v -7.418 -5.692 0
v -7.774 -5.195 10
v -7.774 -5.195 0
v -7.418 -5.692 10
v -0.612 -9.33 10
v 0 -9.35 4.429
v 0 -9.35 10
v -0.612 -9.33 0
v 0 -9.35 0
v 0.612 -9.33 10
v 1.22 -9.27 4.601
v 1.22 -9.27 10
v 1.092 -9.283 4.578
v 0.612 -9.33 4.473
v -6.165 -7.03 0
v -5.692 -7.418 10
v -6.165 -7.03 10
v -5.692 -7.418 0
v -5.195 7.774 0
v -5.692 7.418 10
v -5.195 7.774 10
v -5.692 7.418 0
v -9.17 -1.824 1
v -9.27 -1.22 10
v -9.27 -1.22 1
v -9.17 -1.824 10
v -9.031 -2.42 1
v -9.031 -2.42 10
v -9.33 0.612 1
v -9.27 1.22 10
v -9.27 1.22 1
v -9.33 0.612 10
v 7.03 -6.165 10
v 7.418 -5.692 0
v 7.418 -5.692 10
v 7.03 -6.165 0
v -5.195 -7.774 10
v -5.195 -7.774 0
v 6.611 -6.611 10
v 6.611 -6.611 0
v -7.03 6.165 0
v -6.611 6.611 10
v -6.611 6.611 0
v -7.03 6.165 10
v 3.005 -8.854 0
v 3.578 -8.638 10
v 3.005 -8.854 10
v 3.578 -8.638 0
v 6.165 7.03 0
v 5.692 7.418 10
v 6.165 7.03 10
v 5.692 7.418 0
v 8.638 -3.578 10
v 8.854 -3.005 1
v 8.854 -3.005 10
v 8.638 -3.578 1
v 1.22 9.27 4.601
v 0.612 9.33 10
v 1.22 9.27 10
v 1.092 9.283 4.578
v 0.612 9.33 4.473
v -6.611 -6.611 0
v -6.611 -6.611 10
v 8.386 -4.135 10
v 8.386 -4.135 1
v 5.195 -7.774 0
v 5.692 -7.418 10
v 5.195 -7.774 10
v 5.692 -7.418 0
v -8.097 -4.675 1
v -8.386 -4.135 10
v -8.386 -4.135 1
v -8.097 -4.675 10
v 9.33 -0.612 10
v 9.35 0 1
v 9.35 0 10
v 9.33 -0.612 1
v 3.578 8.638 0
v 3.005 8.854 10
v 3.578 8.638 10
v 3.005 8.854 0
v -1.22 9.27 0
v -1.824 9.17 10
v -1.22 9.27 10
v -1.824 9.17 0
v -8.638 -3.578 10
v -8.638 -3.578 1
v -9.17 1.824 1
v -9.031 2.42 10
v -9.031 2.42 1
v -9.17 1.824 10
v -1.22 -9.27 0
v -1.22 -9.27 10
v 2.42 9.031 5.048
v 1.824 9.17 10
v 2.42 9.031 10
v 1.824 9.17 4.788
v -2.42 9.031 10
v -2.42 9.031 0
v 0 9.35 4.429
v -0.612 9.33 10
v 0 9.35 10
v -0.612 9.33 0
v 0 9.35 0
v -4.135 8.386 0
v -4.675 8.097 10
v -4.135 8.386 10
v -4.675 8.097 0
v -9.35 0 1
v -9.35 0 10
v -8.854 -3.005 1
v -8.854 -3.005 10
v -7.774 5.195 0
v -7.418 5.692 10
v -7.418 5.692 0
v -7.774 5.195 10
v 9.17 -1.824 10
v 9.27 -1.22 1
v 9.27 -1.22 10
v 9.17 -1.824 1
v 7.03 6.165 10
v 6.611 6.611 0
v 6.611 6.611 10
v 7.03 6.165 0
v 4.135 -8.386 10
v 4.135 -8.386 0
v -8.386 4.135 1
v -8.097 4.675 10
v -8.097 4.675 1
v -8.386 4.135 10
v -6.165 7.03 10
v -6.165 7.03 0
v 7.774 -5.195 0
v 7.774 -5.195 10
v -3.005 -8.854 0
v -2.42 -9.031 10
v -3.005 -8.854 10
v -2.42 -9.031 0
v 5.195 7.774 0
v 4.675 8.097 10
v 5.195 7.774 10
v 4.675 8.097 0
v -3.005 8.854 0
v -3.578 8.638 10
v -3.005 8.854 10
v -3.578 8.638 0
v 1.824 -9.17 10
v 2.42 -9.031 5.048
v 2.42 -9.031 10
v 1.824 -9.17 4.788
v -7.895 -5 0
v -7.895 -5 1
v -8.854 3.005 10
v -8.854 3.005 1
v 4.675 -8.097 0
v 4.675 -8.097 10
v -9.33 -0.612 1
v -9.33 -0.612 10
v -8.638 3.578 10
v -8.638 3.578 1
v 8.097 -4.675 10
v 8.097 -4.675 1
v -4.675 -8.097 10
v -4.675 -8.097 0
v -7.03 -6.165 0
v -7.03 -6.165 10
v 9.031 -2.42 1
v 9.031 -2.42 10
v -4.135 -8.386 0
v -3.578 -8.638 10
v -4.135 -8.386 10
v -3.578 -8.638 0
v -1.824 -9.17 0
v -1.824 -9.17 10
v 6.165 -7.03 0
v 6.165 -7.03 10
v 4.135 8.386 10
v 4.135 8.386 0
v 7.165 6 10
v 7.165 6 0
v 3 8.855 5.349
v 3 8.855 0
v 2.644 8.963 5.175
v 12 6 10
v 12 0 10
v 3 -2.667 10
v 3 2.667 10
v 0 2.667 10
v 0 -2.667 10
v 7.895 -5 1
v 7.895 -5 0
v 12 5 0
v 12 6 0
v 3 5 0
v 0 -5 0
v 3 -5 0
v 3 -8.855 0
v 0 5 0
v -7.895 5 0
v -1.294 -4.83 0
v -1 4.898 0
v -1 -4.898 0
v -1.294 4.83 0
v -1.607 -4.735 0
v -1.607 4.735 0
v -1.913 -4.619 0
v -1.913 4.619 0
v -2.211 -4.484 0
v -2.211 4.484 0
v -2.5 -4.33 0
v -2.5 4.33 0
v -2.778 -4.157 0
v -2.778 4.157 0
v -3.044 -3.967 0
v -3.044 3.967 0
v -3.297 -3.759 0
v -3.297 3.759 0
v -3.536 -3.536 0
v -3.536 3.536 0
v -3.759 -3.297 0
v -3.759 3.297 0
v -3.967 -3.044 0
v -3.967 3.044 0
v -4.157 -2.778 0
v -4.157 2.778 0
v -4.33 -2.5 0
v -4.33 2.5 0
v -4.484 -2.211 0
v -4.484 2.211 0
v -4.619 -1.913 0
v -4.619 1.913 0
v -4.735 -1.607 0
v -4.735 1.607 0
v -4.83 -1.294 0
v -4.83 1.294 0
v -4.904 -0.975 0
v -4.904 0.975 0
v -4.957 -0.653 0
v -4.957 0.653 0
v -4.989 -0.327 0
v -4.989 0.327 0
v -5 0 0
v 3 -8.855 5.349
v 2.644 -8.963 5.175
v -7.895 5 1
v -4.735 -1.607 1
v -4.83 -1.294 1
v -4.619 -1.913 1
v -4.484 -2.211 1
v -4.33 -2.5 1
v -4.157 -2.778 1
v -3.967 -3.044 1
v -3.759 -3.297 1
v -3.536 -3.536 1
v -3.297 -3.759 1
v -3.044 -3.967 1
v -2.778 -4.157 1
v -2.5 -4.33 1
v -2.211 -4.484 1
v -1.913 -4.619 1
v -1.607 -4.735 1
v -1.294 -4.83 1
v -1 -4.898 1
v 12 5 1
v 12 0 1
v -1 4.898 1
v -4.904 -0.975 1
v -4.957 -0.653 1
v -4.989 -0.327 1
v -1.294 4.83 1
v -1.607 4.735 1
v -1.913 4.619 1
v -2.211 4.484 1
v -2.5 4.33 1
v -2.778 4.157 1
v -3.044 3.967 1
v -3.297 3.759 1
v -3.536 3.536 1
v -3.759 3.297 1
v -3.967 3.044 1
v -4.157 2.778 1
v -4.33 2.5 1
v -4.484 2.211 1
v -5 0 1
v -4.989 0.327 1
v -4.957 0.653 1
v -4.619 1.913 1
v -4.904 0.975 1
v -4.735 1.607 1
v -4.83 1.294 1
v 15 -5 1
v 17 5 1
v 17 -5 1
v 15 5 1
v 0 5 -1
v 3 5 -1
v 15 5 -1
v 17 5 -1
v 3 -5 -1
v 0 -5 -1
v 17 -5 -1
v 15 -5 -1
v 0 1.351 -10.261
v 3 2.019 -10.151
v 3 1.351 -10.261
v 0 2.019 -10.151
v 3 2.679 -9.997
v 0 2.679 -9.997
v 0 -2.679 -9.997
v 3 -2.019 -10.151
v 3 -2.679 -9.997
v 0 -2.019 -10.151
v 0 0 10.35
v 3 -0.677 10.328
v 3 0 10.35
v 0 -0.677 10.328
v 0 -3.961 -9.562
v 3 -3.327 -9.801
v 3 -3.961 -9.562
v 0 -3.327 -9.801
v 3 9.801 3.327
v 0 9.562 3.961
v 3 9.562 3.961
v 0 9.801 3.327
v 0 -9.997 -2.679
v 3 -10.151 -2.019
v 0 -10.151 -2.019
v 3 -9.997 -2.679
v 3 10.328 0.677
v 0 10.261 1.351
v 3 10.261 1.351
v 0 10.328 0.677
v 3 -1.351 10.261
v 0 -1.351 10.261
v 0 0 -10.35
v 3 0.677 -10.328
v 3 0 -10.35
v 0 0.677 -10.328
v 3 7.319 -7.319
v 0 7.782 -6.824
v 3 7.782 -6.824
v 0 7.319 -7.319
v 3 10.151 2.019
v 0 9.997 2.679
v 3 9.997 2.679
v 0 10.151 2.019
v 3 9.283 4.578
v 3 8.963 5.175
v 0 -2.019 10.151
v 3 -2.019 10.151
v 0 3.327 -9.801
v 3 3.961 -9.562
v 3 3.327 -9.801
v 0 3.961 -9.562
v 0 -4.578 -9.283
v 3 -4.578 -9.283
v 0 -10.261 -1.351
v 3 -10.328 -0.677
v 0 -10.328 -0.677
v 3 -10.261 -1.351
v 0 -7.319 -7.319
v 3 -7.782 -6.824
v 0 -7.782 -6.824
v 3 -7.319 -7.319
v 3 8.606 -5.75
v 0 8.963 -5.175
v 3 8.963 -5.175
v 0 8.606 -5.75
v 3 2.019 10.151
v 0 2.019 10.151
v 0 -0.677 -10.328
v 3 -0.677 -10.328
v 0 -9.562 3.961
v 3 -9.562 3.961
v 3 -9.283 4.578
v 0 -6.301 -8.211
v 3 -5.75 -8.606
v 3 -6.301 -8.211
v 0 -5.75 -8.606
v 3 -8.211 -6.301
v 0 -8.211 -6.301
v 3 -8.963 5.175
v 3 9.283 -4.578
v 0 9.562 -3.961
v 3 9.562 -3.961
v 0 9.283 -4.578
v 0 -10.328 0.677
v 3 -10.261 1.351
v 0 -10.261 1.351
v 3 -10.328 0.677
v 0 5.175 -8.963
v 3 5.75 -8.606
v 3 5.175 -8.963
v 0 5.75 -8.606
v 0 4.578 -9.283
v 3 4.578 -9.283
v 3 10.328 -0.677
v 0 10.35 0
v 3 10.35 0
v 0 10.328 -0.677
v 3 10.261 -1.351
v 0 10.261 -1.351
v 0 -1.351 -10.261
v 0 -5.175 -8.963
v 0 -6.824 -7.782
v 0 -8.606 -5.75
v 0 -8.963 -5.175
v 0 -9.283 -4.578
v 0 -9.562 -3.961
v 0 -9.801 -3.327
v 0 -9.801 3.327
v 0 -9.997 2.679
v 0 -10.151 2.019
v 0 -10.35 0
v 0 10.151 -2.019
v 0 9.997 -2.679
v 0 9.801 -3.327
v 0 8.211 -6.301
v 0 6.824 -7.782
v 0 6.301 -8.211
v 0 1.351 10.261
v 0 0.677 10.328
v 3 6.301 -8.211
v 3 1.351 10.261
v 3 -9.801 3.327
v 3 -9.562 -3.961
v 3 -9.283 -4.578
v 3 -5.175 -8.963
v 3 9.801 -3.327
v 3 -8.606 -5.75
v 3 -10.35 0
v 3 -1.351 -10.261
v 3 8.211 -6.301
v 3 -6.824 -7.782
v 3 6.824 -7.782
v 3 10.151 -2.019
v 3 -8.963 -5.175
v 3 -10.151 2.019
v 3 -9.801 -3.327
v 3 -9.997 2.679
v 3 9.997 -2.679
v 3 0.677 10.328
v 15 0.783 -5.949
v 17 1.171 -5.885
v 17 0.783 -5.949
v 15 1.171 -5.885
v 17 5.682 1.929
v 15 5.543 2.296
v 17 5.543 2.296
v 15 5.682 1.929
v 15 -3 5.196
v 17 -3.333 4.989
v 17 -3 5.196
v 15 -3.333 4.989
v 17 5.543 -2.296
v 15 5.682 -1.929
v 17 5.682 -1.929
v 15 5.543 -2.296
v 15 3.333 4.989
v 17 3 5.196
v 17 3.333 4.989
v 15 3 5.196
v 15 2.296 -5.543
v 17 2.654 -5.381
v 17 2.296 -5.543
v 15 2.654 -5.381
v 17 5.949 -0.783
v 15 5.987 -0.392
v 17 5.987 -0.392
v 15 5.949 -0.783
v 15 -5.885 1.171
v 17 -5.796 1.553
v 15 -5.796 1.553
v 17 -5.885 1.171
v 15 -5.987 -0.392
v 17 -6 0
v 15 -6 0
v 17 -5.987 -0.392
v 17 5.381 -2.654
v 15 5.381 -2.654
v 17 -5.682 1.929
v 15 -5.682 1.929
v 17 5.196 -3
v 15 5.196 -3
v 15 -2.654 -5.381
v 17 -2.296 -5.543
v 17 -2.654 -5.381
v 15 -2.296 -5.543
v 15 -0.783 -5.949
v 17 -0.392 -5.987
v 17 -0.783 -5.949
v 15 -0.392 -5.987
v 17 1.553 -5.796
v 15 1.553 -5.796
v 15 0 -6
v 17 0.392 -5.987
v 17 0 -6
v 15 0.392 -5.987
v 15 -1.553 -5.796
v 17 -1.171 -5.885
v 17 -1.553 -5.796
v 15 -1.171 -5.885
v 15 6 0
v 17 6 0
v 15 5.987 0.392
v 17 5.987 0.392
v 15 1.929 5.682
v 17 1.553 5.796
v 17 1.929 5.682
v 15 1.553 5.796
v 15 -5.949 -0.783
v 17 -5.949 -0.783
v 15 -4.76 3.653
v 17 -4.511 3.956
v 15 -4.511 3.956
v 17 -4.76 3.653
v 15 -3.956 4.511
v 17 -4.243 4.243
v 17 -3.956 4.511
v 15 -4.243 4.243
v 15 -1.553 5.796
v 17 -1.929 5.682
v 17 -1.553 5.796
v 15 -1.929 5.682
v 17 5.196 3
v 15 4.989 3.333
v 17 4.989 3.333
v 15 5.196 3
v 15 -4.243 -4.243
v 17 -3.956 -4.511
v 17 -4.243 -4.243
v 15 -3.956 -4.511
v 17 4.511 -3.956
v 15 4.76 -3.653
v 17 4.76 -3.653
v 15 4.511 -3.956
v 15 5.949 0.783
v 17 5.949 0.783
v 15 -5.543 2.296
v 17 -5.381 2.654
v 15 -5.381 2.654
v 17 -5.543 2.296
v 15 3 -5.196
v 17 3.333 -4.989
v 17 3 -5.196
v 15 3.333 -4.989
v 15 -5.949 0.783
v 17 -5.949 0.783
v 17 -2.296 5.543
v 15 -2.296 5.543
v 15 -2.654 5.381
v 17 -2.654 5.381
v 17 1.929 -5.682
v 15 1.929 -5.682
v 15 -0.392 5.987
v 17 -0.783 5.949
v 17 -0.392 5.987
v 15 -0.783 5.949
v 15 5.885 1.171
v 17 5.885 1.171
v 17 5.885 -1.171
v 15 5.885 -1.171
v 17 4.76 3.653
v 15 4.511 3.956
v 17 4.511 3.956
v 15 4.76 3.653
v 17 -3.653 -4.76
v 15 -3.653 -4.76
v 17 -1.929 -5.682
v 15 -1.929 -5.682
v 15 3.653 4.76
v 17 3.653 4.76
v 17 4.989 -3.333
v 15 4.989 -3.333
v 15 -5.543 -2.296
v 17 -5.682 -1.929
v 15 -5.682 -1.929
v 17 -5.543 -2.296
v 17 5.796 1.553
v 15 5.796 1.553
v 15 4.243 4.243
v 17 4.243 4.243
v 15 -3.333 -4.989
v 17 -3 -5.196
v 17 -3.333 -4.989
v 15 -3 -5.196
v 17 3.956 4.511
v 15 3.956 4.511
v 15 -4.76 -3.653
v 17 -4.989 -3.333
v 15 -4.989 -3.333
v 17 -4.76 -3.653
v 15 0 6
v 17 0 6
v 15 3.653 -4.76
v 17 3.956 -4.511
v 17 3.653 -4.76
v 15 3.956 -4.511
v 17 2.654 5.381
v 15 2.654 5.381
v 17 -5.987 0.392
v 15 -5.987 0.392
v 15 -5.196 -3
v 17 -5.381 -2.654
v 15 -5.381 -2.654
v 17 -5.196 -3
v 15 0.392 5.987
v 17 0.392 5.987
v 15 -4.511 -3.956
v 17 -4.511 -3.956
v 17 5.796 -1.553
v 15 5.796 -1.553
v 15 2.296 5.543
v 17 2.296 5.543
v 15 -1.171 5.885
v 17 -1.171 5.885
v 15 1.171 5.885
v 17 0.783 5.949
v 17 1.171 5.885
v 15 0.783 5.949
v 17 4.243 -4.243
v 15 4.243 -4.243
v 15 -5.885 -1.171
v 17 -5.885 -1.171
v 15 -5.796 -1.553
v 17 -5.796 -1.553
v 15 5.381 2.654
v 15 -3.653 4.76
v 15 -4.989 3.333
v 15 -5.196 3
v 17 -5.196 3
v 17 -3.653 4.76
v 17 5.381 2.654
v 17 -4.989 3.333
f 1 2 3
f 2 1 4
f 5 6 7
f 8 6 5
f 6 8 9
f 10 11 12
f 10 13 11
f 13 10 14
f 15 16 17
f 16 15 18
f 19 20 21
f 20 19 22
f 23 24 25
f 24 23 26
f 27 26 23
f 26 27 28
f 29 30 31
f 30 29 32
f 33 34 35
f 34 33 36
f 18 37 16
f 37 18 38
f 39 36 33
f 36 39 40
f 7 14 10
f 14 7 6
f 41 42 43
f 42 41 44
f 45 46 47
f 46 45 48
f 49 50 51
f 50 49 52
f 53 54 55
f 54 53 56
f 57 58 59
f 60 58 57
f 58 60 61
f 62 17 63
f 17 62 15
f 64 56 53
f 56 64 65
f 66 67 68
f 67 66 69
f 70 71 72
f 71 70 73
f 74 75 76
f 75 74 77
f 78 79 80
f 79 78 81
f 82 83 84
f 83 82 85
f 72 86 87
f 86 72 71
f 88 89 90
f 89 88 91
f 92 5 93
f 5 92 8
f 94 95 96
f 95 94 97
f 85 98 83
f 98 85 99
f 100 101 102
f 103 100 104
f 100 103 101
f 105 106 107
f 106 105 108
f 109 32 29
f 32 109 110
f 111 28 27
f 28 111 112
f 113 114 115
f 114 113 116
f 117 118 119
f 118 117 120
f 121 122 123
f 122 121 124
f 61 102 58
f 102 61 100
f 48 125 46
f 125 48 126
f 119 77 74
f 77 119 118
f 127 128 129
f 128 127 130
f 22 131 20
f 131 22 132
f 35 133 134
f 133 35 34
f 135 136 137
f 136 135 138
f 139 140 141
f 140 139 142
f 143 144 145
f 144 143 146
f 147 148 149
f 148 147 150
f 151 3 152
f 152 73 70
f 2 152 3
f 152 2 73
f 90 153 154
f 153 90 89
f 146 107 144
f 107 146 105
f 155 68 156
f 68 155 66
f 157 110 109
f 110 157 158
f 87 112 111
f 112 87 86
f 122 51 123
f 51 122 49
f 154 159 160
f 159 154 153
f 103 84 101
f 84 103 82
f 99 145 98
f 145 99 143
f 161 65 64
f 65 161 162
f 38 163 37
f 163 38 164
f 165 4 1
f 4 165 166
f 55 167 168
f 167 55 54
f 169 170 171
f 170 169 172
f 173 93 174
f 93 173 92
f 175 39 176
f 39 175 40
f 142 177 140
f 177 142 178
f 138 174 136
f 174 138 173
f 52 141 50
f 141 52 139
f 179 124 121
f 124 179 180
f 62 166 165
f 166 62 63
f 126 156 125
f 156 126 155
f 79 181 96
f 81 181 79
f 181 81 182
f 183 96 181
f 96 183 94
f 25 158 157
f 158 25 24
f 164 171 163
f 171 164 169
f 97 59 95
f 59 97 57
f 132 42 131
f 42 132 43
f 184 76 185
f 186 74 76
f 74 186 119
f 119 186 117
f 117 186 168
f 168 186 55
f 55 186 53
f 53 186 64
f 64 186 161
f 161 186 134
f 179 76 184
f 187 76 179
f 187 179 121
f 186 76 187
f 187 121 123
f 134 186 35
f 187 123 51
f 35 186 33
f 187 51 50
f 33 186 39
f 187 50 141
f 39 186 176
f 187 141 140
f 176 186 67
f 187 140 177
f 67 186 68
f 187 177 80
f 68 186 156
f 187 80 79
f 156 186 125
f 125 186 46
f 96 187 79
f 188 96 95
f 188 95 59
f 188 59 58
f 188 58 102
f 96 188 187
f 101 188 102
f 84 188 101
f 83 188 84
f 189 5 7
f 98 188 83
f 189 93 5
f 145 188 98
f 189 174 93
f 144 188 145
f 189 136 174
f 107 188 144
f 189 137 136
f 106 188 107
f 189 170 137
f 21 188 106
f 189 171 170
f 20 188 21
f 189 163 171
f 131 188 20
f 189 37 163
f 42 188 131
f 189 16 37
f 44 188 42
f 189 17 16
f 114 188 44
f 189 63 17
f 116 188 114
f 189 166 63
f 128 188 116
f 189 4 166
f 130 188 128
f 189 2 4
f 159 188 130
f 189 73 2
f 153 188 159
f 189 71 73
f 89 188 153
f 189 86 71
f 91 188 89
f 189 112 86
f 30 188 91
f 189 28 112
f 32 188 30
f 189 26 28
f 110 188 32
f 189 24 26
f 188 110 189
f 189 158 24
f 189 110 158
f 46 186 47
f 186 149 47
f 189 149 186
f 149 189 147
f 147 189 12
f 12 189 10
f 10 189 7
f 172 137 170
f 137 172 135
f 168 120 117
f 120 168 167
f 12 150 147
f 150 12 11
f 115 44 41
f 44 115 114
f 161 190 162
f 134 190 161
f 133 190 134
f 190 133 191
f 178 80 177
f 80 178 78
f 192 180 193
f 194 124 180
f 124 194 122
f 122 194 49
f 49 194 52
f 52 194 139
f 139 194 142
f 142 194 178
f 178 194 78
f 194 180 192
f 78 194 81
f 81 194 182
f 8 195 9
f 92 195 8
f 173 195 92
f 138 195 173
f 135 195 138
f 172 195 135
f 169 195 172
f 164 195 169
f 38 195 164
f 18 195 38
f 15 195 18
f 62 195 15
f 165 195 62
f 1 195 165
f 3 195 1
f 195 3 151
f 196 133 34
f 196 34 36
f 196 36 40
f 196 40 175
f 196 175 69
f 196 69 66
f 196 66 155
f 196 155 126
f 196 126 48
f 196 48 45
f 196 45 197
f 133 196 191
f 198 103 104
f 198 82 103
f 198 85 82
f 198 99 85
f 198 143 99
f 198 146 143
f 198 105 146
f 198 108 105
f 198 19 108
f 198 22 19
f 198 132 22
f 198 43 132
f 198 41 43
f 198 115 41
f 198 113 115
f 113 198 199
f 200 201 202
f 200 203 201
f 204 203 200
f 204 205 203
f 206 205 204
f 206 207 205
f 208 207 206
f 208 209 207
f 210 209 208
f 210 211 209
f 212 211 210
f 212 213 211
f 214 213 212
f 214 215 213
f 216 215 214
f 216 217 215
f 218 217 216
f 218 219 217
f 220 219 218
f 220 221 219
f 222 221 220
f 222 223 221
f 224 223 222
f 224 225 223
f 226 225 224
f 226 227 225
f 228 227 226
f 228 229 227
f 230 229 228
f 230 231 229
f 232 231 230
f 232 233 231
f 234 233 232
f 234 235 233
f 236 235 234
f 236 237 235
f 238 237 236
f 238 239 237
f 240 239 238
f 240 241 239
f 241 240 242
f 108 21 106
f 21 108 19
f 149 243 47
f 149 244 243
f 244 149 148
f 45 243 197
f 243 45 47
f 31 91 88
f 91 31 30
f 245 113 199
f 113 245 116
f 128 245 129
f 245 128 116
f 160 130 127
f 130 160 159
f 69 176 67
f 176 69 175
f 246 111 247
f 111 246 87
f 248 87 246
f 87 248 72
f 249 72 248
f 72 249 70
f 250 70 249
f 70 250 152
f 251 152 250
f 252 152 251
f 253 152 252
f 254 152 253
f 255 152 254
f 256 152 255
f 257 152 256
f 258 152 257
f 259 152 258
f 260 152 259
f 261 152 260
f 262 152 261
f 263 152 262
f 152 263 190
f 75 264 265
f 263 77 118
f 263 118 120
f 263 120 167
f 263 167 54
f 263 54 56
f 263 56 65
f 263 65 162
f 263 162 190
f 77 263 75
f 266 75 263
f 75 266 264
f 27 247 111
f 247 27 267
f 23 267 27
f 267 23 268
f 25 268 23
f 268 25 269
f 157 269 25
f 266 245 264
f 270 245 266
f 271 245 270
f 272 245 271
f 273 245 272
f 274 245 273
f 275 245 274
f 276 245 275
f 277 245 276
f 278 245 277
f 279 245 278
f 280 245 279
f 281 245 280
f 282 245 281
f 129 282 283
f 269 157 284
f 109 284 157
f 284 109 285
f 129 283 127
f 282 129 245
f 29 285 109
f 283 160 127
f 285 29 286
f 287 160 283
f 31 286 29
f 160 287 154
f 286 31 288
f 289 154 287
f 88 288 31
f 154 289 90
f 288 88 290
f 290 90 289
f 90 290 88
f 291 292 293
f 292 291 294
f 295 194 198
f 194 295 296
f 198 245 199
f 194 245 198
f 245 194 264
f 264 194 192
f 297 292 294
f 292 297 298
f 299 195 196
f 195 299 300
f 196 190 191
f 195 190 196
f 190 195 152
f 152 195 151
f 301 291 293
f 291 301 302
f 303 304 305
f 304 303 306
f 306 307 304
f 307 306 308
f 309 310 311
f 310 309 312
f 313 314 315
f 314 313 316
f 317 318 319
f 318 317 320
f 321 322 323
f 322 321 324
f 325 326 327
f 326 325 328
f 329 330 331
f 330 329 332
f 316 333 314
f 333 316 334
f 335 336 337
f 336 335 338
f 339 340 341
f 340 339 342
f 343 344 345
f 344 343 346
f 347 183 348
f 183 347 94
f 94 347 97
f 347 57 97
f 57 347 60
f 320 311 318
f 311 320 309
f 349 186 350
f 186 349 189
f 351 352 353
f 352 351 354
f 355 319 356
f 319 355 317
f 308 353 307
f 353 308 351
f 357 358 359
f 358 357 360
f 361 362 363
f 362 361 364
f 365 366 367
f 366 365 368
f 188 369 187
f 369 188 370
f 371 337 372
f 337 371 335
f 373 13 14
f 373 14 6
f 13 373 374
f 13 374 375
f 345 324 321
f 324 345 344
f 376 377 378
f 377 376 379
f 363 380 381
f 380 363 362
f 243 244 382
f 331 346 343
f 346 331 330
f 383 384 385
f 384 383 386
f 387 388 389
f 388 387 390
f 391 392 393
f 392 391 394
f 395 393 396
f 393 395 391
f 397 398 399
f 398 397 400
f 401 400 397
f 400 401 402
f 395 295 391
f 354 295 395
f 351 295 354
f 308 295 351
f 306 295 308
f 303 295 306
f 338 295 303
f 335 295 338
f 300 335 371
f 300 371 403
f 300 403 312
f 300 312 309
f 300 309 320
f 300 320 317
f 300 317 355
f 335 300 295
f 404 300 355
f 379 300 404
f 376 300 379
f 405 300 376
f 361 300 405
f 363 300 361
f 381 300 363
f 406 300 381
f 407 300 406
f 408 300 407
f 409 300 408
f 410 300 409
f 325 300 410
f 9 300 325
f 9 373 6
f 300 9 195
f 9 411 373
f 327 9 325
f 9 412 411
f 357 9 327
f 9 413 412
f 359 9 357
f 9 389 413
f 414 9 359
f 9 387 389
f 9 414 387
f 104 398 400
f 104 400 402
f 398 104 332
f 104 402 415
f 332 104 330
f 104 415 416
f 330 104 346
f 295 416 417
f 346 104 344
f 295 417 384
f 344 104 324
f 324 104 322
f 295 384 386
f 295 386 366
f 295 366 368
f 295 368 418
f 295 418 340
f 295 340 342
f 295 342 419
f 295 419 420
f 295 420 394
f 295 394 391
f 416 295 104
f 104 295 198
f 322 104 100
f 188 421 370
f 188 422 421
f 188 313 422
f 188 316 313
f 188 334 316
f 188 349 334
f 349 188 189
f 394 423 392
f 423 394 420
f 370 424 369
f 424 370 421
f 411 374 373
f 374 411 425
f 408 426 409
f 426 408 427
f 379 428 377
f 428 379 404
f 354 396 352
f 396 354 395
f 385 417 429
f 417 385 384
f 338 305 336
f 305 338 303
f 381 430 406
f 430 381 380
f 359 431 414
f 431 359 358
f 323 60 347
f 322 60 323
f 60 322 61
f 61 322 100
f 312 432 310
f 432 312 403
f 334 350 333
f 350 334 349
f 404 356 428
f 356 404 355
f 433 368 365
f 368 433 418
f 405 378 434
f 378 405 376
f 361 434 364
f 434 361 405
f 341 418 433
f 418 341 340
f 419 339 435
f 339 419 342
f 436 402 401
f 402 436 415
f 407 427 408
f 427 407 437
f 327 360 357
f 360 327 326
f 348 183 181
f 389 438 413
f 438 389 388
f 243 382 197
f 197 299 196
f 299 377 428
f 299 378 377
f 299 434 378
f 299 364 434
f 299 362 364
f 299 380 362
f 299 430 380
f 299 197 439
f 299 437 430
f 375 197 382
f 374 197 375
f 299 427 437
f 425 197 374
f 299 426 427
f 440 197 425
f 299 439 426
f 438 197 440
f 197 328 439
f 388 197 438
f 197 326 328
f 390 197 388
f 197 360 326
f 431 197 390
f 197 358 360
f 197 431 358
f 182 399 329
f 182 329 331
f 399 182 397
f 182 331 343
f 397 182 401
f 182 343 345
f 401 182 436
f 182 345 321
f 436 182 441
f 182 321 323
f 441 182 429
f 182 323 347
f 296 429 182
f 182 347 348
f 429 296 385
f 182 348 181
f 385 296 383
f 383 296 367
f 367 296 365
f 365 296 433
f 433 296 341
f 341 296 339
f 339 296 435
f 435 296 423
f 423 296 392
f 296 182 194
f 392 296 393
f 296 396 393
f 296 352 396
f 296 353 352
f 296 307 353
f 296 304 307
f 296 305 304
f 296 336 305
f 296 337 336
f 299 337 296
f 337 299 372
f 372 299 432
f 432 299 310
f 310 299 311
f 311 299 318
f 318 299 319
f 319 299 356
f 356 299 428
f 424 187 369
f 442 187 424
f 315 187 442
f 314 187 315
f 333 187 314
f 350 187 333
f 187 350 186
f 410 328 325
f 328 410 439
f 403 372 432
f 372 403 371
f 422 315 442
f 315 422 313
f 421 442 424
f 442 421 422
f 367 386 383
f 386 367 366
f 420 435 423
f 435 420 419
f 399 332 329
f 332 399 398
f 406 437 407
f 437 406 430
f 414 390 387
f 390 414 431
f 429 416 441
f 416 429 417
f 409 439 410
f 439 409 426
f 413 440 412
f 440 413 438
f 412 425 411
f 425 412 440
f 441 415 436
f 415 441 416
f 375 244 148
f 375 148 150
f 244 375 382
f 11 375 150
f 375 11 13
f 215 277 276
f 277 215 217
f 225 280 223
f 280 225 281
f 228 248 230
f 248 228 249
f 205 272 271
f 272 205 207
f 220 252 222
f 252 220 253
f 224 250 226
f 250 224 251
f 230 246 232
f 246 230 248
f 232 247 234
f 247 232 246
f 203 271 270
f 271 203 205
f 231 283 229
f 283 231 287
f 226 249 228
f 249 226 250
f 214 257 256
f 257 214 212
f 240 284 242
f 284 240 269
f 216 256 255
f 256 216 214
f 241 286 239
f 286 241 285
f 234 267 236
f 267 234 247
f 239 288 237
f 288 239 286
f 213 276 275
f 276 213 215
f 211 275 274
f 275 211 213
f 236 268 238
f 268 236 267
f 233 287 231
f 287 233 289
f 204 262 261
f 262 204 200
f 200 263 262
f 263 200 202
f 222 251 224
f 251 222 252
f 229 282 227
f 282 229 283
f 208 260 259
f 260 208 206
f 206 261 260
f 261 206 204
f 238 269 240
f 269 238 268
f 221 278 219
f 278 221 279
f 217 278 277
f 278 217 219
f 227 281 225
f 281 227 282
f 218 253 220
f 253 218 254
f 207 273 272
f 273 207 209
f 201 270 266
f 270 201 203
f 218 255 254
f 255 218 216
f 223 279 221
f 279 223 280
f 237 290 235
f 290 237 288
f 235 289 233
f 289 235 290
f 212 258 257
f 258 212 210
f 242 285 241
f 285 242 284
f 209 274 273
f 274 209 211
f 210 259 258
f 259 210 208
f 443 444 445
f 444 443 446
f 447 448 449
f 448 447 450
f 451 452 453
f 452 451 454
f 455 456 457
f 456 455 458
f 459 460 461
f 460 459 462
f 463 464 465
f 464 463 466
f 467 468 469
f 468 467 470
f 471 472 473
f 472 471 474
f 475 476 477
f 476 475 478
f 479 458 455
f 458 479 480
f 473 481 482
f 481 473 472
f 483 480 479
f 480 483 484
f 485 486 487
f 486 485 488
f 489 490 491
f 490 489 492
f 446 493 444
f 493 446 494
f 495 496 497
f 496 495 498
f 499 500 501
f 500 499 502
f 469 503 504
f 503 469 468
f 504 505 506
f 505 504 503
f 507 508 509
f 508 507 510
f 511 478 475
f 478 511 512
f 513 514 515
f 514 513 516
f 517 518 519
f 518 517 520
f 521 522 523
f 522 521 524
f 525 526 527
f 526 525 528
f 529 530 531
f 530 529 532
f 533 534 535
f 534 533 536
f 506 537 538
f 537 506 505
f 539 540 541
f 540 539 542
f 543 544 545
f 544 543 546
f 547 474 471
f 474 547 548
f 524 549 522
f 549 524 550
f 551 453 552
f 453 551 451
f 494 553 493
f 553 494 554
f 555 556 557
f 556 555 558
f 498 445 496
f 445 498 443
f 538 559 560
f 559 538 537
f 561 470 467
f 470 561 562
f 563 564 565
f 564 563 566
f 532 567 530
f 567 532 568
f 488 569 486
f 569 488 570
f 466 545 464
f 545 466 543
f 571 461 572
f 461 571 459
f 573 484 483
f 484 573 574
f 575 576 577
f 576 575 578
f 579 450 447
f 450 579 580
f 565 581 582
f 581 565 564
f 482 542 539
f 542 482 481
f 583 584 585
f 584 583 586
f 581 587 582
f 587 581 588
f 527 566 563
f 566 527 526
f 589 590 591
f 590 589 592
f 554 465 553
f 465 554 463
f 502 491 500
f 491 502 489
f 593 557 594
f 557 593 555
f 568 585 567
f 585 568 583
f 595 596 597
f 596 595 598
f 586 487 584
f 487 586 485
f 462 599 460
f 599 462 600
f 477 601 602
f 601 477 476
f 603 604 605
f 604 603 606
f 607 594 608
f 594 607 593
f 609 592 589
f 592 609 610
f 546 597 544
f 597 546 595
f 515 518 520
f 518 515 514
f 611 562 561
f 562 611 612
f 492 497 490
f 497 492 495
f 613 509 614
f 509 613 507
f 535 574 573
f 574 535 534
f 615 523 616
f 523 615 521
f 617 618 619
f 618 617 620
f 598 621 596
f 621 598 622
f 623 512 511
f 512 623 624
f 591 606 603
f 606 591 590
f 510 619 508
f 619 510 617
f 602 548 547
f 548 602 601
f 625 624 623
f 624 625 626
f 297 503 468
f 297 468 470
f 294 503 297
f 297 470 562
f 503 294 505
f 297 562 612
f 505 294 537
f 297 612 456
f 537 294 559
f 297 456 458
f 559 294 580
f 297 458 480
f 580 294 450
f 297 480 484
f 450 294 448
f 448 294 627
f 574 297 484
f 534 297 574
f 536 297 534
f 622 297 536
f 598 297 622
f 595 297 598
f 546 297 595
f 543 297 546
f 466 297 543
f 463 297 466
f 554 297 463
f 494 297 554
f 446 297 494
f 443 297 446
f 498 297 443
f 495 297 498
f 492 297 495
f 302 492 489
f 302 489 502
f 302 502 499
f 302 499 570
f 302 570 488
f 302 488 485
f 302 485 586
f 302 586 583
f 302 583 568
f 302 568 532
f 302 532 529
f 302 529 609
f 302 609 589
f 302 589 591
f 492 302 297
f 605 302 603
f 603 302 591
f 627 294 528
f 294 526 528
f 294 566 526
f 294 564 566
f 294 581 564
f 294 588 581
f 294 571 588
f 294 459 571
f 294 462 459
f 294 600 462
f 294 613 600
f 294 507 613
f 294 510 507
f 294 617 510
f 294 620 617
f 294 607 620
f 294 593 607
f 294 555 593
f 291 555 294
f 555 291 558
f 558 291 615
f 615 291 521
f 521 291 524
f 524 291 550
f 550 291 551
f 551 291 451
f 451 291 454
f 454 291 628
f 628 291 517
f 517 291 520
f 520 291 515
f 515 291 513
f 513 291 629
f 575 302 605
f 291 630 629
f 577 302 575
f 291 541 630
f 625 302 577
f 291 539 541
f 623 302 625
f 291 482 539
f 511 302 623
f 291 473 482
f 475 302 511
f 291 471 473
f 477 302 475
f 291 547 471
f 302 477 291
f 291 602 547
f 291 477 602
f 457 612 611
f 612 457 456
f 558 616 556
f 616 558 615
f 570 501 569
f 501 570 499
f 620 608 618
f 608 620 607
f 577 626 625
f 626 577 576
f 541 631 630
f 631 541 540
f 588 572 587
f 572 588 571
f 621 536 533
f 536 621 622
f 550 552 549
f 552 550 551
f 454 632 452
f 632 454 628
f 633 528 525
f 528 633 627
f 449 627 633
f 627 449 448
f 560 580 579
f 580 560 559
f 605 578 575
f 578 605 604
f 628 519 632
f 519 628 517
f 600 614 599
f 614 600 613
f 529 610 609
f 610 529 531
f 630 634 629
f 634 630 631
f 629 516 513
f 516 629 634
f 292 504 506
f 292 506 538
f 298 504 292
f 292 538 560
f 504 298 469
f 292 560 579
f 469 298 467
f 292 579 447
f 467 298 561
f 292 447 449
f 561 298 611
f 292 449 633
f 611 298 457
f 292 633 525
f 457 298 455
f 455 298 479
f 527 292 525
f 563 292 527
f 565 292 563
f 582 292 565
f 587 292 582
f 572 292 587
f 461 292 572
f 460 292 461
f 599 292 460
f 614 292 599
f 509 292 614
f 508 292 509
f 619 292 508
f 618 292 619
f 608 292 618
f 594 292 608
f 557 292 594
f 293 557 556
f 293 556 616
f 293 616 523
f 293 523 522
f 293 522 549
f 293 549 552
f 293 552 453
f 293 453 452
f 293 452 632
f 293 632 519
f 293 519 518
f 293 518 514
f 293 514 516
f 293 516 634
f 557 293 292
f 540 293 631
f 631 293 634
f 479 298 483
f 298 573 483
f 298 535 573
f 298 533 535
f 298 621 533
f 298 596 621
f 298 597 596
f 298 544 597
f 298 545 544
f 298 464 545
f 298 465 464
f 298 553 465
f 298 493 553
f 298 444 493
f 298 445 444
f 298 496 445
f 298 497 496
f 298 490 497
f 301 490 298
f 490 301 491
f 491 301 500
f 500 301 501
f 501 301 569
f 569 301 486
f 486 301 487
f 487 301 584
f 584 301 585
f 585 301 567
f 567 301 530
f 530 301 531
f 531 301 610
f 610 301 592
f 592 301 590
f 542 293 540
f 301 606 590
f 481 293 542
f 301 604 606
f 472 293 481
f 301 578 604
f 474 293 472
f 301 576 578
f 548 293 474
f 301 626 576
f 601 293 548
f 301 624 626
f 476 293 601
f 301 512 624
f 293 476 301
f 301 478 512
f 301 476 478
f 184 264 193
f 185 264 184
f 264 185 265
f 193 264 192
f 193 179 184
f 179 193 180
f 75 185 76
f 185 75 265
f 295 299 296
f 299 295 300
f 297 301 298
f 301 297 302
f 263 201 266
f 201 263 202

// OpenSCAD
// Snap-on clip - a flat (10 mm tall) part that snaps onto a round stand rod and holds a piece
// of round tubing next to it, with a bridge joining the two rings. NOVEL general part.
//

rod_d  = 12.7;
ring_w = 3;
t      = 10;
tube_d = 6;
tube_w = 2;

$fn = 96;

ring_o = rod_d + 2 * ring_w;

difference() {
    union() {
        ring(x = 0, y = 0, d = ring_o, w = ring_w);
        ring(x = 15, y = 0, d = tube_d + 2 * tube_w, w = tube_w);
        cube([12, 6, t]);
    }
    translate([-1, -5, -1]) cube([18.7, 10, 2]);                 // opening in the rod ring
    translate([15, -2.25, -1]) cube([4.5, 4.5, 2]);               // opening in the tubing ring
}

// Ring: a circle with a rectangular cut out of its -X side (open ring).
module ring(x, y, d, w) {
    difference() {
        cylinder(h = t, d = d);
        translate([x - d / 2 - 1, -5, -1]) cube([d + 2, 10, 2]);
    }
    translate([x, y, 0]) rotate([0, 90, 0]) cylinder(h = w, d = d + 2);  // wall thickens the cut edge
}
